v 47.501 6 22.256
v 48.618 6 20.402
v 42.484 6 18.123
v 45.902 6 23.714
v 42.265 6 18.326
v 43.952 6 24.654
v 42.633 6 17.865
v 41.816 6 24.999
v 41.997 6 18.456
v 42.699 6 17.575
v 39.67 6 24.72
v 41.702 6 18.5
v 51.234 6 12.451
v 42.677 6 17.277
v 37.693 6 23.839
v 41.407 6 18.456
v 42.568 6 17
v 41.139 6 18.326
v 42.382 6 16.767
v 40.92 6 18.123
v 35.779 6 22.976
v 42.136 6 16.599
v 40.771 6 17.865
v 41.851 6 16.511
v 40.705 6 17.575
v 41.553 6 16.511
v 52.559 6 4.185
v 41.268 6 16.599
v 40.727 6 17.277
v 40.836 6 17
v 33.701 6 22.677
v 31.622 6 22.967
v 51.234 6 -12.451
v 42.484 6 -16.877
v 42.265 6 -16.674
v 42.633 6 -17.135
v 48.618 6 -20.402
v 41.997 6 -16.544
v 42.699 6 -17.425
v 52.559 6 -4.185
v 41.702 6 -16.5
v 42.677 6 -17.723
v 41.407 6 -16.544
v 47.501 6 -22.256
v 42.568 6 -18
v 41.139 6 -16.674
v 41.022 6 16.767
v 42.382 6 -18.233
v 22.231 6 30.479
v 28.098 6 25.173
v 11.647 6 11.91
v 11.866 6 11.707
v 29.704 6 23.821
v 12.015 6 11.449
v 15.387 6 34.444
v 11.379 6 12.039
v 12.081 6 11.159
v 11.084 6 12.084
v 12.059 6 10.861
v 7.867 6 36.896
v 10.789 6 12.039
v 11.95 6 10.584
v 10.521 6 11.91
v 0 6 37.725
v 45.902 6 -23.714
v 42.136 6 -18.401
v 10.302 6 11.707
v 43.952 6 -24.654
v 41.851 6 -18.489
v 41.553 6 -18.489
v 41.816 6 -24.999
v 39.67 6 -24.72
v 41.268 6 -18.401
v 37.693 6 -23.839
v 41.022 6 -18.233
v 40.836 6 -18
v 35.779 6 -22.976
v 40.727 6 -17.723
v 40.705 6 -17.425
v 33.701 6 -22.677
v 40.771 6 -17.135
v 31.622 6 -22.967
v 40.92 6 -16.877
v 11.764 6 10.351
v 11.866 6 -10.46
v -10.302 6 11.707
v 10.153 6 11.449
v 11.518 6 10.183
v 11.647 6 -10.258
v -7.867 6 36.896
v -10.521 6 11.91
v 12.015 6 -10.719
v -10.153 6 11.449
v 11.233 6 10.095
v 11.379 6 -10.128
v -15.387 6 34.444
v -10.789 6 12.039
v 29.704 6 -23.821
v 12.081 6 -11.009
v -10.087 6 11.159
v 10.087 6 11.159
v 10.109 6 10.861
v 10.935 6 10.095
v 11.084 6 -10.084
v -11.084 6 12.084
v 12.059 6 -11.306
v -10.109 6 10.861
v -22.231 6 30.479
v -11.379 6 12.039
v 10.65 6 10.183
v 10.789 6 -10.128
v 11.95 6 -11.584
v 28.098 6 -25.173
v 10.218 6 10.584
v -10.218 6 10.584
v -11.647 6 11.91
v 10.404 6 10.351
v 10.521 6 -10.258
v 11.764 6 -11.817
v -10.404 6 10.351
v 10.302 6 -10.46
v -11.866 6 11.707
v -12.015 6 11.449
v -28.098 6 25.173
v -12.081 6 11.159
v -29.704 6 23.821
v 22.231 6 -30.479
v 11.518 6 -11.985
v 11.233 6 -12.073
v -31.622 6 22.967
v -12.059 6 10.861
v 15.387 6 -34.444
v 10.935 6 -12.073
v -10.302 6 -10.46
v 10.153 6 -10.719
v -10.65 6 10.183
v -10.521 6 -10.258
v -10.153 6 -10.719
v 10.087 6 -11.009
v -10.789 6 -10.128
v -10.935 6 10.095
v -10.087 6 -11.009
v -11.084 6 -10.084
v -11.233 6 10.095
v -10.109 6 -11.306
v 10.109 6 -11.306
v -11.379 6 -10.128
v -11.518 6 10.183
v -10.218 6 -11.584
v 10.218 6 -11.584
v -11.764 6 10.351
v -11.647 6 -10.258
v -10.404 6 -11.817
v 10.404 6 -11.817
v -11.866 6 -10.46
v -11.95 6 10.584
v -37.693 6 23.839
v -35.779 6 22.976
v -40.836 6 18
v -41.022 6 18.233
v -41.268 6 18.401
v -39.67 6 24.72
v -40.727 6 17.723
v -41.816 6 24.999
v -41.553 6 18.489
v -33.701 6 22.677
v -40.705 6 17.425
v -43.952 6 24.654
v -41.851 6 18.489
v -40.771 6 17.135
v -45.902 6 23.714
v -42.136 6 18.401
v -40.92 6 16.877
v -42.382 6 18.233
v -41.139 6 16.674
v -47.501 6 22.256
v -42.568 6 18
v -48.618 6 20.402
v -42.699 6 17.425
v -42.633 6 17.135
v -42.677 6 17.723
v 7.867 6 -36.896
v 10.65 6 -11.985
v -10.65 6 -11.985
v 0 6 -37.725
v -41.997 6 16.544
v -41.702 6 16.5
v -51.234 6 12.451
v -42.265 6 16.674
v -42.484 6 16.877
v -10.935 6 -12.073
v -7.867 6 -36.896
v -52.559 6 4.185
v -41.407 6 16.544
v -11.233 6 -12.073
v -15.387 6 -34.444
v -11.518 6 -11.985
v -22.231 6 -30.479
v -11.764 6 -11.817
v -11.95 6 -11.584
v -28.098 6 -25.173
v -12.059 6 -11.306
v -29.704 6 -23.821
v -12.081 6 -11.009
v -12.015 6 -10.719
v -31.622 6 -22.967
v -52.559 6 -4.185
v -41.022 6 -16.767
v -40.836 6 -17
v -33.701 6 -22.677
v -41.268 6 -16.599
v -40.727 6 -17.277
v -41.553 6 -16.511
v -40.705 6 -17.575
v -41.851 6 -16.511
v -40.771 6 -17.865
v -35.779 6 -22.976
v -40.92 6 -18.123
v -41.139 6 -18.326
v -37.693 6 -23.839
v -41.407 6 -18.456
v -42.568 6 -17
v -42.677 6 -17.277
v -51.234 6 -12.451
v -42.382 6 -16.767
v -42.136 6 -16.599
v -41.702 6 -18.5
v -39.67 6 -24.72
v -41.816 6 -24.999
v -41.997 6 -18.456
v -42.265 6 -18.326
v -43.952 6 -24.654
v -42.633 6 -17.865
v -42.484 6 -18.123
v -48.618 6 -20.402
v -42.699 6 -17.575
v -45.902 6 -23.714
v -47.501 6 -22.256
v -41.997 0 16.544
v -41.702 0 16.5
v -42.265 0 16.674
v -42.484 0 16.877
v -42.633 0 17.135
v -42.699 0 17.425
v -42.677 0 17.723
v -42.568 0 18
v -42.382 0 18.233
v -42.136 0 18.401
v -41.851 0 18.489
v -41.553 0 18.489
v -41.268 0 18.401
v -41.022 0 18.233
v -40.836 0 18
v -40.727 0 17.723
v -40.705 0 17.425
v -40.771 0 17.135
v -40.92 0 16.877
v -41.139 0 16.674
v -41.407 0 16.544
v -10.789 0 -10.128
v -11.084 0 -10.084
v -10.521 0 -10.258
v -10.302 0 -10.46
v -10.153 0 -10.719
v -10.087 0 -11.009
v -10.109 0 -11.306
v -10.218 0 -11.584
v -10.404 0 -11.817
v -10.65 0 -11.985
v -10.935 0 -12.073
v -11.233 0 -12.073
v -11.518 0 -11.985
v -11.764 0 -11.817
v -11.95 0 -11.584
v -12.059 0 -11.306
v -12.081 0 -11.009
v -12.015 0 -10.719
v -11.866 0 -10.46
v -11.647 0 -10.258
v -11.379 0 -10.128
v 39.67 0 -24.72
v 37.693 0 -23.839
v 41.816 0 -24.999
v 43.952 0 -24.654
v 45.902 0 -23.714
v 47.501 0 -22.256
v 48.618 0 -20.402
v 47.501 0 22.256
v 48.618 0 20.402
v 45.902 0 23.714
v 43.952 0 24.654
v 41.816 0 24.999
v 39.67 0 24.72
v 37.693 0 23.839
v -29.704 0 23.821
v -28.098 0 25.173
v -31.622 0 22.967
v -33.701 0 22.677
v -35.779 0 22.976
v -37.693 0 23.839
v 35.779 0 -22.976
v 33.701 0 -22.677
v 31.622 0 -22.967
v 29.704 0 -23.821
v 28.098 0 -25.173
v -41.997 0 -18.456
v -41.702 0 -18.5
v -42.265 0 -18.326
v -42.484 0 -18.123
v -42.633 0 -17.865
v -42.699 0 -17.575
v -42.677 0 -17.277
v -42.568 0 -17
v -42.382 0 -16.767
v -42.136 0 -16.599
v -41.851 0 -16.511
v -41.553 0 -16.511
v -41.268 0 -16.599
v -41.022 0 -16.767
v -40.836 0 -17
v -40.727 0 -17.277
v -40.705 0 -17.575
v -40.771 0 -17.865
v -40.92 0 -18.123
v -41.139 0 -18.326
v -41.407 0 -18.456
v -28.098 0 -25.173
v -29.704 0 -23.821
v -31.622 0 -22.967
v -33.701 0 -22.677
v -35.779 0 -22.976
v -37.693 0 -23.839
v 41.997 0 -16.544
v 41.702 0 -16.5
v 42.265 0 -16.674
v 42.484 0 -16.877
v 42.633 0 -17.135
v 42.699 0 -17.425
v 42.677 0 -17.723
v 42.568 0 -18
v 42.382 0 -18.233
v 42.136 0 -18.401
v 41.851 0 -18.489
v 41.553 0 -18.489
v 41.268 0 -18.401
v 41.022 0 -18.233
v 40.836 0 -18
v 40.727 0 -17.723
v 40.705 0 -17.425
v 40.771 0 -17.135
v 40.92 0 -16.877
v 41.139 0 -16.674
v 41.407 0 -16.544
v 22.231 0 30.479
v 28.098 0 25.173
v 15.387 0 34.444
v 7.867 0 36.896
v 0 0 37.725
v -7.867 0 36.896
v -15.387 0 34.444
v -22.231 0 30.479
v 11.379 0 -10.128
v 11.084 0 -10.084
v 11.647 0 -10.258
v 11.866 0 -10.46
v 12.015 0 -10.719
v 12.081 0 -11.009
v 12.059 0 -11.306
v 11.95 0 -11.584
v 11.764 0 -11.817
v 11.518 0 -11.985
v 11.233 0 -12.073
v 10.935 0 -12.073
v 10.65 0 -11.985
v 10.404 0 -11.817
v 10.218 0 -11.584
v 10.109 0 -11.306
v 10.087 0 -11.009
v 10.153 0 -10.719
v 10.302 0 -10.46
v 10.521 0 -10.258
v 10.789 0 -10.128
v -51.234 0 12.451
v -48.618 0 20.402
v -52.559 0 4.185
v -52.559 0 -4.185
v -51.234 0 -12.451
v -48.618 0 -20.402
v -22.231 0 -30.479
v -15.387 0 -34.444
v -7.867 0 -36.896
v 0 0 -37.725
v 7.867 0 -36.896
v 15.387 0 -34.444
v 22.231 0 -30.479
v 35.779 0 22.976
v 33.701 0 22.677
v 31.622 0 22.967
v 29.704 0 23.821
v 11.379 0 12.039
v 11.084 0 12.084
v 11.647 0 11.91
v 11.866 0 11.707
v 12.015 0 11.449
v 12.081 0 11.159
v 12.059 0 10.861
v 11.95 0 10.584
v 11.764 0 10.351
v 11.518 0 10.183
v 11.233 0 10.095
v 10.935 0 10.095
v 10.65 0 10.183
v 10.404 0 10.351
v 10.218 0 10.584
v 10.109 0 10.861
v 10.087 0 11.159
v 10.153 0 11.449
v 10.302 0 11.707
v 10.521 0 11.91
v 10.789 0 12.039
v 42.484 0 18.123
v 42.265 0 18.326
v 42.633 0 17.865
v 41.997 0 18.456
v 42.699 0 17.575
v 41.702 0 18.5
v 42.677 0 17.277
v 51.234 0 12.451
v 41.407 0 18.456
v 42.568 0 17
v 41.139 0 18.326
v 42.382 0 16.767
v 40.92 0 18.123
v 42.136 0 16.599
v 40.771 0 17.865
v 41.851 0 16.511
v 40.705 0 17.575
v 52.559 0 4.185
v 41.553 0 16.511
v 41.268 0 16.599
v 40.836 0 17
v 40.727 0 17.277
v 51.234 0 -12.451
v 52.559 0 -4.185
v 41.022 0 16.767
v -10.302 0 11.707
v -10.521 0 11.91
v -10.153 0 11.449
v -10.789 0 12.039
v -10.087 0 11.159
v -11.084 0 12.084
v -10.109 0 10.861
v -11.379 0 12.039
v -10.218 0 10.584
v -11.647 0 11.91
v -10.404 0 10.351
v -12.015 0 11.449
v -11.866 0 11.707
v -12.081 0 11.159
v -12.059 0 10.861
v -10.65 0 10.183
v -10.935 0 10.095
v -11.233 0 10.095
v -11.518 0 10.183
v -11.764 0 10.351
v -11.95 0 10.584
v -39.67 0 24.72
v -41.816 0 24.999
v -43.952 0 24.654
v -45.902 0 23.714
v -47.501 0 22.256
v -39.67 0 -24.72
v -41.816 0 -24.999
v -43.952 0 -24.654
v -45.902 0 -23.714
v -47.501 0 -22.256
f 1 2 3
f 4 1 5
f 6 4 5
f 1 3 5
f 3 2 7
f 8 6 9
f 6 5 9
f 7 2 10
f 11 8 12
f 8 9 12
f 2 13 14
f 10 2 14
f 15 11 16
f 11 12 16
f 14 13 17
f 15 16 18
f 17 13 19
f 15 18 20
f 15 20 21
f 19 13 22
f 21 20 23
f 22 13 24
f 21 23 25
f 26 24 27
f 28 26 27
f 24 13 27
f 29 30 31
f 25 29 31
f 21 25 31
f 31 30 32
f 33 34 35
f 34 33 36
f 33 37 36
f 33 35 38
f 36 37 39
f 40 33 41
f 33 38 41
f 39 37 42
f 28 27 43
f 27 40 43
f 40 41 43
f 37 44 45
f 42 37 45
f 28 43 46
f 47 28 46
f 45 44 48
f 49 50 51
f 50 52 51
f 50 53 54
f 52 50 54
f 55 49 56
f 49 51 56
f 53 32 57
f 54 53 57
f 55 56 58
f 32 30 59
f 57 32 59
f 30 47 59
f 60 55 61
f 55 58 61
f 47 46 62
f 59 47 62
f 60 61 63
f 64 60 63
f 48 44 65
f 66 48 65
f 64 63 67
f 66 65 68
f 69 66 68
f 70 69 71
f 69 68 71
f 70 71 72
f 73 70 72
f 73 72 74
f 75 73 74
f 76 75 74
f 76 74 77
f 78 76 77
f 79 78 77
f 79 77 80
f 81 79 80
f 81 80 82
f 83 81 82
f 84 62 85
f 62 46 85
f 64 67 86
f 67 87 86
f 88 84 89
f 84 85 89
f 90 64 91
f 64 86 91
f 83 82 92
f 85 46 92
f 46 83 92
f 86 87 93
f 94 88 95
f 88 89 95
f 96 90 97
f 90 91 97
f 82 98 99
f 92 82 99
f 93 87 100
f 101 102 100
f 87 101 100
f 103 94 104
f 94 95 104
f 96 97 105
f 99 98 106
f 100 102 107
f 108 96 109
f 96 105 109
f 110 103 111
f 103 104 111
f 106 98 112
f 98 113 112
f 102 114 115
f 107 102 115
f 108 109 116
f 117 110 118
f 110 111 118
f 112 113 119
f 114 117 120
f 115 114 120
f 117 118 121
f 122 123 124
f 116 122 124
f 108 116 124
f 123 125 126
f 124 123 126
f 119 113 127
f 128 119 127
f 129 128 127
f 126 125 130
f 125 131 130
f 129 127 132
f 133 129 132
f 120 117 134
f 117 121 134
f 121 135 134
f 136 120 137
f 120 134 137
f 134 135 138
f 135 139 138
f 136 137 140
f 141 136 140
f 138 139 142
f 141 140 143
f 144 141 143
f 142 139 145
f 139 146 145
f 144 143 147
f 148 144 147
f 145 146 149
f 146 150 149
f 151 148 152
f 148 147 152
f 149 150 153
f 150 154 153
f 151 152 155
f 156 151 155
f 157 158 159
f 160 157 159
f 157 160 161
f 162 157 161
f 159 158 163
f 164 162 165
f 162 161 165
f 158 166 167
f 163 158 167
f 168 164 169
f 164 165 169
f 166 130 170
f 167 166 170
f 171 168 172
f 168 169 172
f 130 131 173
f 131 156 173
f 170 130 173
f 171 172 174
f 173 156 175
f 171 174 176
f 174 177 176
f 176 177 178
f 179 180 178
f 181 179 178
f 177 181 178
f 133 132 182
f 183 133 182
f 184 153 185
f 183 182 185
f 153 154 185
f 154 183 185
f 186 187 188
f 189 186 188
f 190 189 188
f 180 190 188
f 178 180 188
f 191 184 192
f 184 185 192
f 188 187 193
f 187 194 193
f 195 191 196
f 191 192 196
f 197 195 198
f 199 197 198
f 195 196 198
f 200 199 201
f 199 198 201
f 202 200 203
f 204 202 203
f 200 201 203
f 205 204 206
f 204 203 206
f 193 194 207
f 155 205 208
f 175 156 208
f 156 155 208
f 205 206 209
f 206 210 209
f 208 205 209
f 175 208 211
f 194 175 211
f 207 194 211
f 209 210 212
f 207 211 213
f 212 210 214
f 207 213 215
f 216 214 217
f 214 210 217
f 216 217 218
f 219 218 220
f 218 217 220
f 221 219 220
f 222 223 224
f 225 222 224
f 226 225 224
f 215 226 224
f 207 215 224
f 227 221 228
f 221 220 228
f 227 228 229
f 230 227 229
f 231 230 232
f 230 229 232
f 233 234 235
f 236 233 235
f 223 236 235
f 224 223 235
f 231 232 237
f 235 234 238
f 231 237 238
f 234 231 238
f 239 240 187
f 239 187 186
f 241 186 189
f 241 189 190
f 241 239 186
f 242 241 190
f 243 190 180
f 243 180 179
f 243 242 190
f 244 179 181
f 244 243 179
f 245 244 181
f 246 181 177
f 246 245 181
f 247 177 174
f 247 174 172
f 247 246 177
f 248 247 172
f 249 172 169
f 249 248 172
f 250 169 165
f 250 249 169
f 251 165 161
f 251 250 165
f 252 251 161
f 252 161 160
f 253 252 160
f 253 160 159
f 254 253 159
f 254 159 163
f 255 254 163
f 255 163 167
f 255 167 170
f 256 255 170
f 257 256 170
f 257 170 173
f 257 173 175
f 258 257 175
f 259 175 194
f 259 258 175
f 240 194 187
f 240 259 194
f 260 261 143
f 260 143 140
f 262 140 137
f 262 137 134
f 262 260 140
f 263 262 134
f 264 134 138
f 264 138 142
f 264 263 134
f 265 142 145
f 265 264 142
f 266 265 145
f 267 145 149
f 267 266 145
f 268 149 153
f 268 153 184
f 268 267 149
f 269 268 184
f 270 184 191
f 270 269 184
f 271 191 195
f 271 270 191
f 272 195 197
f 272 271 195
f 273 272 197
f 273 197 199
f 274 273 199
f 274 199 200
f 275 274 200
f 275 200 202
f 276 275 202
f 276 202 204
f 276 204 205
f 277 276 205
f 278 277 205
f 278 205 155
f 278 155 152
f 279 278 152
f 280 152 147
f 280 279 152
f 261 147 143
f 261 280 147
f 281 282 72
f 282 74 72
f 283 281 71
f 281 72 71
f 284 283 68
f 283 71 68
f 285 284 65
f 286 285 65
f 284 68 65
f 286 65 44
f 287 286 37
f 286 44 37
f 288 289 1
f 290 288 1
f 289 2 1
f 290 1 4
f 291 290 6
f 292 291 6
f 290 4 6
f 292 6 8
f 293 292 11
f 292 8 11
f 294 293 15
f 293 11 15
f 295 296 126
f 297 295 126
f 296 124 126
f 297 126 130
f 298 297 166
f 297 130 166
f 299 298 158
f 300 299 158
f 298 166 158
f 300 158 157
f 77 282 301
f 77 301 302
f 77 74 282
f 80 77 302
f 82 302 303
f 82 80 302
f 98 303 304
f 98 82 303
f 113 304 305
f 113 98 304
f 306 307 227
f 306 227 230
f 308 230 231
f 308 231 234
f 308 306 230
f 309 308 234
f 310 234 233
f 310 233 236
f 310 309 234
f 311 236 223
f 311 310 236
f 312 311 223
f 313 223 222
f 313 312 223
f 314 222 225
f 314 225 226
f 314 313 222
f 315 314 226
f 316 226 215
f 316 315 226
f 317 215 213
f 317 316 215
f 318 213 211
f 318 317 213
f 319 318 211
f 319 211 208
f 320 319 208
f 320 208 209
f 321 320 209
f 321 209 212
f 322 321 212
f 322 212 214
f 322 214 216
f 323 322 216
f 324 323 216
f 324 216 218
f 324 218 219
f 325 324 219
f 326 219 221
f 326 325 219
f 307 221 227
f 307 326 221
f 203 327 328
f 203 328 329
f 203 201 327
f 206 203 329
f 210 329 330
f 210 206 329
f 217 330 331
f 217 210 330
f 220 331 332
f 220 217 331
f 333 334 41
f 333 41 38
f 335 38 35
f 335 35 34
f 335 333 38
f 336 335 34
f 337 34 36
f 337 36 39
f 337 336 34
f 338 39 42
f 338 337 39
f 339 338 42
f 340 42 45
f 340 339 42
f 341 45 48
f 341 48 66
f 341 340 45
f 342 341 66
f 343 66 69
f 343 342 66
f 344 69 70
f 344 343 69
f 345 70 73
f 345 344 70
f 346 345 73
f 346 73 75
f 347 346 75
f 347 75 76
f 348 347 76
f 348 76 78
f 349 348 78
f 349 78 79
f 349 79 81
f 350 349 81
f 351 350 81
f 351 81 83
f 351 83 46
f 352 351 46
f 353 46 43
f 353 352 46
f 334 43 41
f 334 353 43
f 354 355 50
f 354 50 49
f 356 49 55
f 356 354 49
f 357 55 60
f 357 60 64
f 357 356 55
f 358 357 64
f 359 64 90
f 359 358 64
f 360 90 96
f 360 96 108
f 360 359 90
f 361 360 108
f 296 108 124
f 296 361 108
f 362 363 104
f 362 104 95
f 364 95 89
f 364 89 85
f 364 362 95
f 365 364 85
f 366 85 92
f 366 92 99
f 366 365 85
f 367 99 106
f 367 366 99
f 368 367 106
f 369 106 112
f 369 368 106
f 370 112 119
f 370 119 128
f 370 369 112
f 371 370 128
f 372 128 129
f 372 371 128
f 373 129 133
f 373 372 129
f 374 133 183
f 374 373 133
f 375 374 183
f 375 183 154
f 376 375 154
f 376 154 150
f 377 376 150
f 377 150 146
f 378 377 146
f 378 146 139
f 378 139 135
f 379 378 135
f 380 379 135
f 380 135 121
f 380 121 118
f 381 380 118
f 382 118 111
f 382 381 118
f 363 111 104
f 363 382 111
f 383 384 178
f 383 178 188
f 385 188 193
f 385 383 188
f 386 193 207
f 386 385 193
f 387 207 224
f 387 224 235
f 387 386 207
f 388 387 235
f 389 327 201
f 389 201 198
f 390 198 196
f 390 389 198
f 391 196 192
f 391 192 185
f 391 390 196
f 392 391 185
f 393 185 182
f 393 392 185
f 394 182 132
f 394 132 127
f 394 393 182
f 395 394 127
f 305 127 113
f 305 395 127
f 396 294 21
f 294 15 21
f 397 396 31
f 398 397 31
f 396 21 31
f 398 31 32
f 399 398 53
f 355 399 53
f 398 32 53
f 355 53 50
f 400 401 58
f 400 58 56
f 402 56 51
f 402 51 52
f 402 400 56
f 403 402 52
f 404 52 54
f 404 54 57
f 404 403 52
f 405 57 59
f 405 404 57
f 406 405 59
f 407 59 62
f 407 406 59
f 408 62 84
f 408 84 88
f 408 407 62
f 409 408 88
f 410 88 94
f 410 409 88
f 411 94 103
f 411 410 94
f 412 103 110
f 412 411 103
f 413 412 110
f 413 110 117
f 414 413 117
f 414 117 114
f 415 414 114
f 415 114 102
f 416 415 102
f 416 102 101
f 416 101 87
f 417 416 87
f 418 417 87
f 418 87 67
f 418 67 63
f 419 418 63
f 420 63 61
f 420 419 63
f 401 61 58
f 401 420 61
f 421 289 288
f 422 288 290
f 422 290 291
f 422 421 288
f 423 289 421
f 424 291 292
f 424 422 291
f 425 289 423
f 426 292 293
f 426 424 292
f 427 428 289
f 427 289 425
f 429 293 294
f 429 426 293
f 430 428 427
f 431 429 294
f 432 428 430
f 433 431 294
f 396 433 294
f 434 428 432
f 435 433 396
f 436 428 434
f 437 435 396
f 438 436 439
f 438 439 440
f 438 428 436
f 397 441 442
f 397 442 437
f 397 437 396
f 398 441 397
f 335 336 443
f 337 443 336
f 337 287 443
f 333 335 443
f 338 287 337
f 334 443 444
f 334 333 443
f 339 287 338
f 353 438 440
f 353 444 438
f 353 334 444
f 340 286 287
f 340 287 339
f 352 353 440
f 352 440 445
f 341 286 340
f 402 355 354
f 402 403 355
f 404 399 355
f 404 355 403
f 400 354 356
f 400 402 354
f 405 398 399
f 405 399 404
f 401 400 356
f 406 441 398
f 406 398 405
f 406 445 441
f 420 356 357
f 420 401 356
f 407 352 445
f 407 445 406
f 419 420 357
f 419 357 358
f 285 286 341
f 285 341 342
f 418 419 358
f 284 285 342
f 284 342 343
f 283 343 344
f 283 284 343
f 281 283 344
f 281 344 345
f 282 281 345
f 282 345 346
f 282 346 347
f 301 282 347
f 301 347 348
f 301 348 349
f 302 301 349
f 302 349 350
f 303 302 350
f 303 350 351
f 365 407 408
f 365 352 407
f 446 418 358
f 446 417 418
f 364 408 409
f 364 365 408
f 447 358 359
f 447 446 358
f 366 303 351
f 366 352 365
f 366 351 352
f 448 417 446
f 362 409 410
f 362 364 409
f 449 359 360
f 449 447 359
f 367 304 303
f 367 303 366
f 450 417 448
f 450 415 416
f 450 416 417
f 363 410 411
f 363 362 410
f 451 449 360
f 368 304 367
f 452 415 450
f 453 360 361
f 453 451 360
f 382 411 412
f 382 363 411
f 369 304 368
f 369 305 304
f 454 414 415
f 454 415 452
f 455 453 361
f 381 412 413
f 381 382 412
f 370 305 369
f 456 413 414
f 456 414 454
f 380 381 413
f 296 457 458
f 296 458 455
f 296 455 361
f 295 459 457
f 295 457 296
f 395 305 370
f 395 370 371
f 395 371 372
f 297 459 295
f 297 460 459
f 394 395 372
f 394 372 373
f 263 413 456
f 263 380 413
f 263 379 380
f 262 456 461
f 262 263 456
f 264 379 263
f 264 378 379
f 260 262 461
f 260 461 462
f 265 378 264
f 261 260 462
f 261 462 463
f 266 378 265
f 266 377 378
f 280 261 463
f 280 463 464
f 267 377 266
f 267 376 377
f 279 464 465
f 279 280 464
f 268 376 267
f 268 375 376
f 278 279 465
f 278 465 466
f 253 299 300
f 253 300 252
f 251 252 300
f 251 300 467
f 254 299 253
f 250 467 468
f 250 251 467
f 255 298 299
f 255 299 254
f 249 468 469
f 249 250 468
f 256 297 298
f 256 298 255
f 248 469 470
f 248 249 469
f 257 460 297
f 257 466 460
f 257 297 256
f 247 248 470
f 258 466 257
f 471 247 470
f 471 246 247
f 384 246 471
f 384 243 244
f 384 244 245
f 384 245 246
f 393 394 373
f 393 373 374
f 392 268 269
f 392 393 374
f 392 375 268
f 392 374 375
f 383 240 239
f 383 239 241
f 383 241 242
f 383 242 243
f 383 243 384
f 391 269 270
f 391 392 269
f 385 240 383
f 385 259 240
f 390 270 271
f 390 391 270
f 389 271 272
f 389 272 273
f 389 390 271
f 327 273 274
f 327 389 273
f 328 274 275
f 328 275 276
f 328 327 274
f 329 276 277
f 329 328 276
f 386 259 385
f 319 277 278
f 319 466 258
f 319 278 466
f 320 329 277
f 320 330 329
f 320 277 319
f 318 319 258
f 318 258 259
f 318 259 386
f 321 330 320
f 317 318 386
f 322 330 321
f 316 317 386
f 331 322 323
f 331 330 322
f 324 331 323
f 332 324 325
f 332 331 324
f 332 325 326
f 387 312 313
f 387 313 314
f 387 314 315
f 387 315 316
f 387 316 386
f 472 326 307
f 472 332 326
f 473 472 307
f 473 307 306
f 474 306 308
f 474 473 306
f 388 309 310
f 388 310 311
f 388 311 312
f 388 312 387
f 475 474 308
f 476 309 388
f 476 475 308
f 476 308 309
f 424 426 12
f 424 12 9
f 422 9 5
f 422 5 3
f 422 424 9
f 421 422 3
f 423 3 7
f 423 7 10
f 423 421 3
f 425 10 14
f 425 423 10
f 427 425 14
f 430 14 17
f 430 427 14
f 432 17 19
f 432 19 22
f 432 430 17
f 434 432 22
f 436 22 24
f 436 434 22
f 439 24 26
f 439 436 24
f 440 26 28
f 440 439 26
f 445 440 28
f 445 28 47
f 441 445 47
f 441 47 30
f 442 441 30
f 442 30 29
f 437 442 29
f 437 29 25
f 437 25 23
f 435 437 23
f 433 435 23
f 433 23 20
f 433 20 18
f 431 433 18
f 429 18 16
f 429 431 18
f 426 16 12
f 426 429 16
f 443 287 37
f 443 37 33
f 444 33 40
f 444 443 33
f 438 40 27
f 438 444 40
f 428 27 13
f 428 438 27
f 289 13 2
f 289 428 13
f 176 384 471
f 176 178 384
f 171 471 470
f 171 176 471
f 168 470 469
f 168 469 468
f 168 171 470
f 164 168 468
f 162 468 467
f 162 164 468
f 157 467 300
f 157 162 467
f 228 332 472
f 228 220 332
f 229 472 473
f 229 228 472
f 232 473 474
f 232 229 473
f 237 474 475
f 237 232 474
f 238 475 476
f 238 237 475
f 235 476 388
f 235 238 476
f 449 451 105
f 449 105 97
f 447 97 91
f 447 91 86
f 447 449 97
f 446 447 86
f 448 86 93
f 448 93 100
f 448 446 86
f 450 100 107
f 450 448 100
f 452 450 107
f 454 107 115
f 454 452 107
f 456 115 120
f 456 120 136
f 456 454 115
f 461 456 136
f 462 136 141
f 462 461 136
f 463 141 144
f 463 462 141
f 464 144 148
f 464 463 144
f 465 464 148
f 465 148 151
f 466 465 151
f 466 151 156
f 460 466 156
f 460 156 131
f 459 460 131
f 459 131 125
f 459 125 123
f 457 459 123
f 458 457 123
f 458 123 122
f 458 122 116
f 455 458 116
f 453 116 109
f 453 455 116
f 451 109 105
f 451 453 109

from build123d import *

# Parameters (mm, degrees)
SKETCH1_R           = 1
BOSS_EXTRUDE1_DEPTH = 6
FILLET1_R           = 7.5


with BuildPart() as part:
    # Sketch1 → Boss-Extrude1 (new body)
    with BuildSketch(Plane(origin=(0, 0, 0), x_dir=(1, 0, 0), z_dir=(0, 1, 0))):
        with BuildLine():
            Line((31.883633055, 20.164562188), (44.561021943, 28.182280752))
            ThreePointArc((44.561021943, 28.182280752), (52.725, 0), (44.561021943, -28.182280752))
            Line((44.561021943, -28.182280752), (31.883633055, -20.164562188))
            ThreePointArc((31.883633055, -20.164562188), (0, -37.725), (-31.883633055, -20.164562188))
            Line((-31.883633055, -20.164562188), (-44.561021943, -28.182280752))
            ThreePointArc((-44.561021943, -28.182280752), (-52.725, 0), (-44.561021943, 28.182280752))
            Line((-44.561021943, 28.182280752), (-31.883633055, 20.164562188))
            ThreePointArc((-31.883633055, 20.164562188), (0, 37.725), (31.883633055, 20.164562188))
        make_face()
        with Locations(Location((-11.083898795, 11.083898795, 0), (0, 0, 270))):
            Circle(SKETCH1_R, mode=Mode.SUBTRACT)
        with Locations(Location((11.083898795, 11.083898795, 0), (0, 0, 270))):
            Circle(SKETCH1_R, mode=Mode.SUBTRACT)
        with Locations(Location((11.083898795, -11.083898795, 0), (0, 0, 270))):
            Circle(SKETCH1_R, mode=Mode.SUBTRACT)
        with Locations(Location((-11.083898795, -11.083898795, 0), (0, 0, 270))):
            Circle(SKETCH1_R, mode=Mode.SUBTRACT)
        with Locations(Location((41.701925915, 17.5, 0), (0, 0, 270))):
            Circle(SKETCH1_R, mode=Mode.SUBTRACT)
        with Locations(Location((41.701925915, -17.5, 0), (0, 0, 270))):
            Circle(SKETCH1_R, mode=Mode.SUBTRACT)
        with Locations(Location((-41.701925915, 17.5, 0), (0, 0, 90))):
            Circle(SKETCH1_R, mode=Mode.SUBTRACT)
        with Locations(Location((-41.701925915, -17.5, 0), (0, 0, 90))):
            Circle(SKETCH1_R, mode=Mode.SUBTRACT)
    extrude(amount=BOSS_EXTRUDE1_DEPTH)

    # Fillet1
    fillet1_edges = [part.edges().sort_by_distance(p)[0] for p in [
        (44.561021943, 3, 28.182280752),
        (31.883633055, 3, 20.164562188),
        (-44.561021943, 3, 28.182280752),
        (-31.883633055, 3, 20.164562188),
        (44.561021943, 3, -28.182280752),
        (31.883633055, 3, -20.164562188),
        (-44.561021943, 3, -28.182280752),
        (-31.883633055, 3, -20.164562188),
    ]]
    fillet(fillet1_edges, radius=FILLET1_R - 0.0001)  # a hair under: the kernel refuses the full size


solid = part.part
